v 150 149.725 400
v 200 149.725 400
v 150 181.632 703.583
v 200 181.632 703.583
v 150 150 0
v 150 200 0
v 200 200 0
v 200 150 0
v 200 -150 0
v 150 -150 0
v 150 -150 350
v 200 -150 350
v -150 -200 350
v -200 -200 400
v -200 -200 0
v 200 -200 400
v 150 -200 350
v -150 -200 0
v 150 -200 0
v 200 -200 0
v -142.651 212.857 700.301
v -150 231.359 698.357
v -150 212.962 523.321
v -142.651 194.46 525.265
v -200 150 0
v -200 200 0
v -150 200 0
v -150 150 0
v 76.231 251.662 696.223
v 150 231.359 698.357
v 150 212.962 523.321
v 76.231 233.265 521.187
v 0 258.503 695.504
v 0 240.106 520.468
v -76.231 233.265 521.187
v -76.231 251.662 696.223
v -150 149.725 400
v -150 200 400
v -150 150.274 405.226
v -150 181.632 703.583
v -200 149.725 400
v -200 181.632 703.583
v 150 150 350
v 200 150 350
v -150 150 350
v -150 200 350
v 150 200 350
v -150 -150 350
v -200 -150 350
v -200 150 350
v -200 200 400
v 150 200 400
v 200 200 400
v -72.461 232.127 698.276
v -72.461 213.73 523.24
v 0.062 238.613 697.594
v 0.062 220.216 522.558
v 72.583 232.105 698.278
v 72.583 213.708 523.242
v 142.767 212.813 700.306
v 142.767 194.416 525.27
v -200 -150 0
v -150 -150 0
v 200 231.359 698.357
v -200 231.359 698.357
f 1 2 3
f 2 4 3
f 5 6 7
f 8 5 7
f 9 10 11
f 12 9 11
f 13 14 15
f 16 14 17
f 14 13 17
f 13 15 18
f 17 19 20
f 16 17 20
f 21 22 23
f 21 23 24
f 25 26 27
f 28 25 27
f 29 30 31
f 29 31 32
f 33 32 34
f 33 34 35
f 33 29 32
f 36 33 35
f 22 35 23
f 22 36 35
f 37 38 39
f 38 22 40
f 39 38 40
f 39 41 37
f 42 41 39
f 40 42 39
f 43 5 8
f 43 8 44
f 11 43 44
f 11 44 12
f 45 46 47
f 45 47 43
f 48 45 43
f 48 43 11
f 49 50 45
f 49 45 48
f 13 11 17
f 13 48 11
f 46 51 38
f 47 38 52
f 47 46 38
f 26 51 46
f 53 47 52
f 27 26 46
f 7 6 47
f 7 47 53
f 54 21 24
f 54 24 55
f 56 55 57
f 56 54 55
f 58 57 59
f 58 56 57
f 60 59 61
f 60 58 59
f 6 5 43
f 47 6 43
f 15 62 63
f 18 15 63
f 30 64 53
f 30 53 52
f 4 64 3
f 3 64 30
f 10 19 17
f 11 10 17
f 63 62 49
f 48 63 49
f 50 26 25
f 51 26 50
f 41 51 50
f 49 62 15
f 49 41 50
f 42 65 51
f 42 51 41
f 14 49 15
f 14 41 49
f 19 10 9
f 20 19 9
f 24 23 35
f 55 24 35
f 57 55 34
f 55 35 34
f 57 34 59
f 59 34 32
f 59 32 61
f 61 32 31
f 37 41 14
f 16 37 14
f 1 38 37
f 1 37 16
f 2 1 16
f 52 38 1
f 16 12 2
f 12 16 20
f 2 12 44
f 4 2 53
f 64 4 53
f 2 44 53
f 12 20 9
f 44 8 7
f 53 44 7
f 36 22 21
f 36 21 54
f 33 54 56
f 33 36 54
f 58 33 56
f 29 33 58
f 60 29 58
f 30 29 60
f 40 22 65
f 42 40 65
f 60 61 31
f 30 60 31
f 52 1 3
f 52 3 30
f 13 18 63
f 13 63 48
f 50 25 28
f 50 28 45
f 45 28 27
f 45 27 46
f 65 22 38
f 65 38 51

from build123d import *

# Parameters (mm, degrees)
F0_W       = 400
F0_H       = 400
F1_DEPTH   = 400
F2_W       = 300
F2_H       = 350
F3_DEPTH   = 400.001
F4_W       = 300
F4_H       = 350
F5_DEPTH   = 400.001
F9_W       = 400
F9_H       = 300
F10_DEPTH  = 50
F11_W      = 300
F11_H      = 300
F12_DEPTH  = 50
F14_DEPTH  = 5.2552117633
F12_FACE_W = 50
F12_FACE_H = 50
F17_DEPTH  = 176


with BuildPart() as f1:
    # F0 (on Top) → F1 (new body)
    with BuildSketch(Plane.XY):
        Rectangle(F0_W, F0_H)
    extrude(amount=F1_DEPTH)

    # F2 (on face) → F3 (cut, through all)
    with BuildSketch(Plane.XZ.offset(200)):
        with Locations((0, 175)):
            Rectangle(F2_W, F2_H)
    extrude(amount=-F3_DEPTH, mode=Mode.SUBTRACT)

    # F4 (on face) → F5 (cut, through all)
    with BuildSketch(Plane(origin=(-200, 0, 0), x_dir=(0, -1, 0), z_dir=(-1, 0, 0))):
        with Locations((0, 175)):
            Rectangle(F4_W, F4_H)
    extrude(amount=-F5_DEPTH, mode=Mode.SUBTRACT)



with BuildPart() as f10:
    # F9 (on line) → F10 (new body)
    with BuildSketch(Plane(origin=(0, 156.2324219098, -16.4206892285), x_dir=(-1, 0, 0), z_dir=(0, 0.9945218954, -0.1045284633))):
        with Locations((0, 568.7144508008)):
            Rectangle(F9_W, F9_H)
    extrude(amount=-F10_DEPTH)

    # F11 (on face) → F12 (cut)
    with BuildSketch(Plane(origin=(0, 106.5063271414, -11.1942660652), x_dir=(1, 0, 0), z_dir=(0, -0.9945218954, 0.1045284633))):
        with Locations((0, 568.7144508008)):
            Rectangle(F11_W, F11_H)
    extrude(amount=-F12_DEPTH, mode=Mode.SUBTRACT)


with BuildPart() as f1_1:
    add(f1.part)
    # F14 (add, through all): a face of the model
    f14_faces = [f10.part.faces().sort_by_distance(p)[0] for p in [
        (175, 175.1369526158, 402.6132115817),
    ]]

    add(f10.part)  # F14 merges F10
    extrude(f14_faces, amount=F14_DEPTH)

    # F12_face (on face) → F15 (join, up to the next surface of F1)
    with BuildSketch(Plane(origin=(175, 175.1369526158, 402.6132115817), x_dir=(1, 0, 0), z_dir=(0, -0.1045284633, -0.9945218954))):
        with Locations((-350, 0)):
            Rectangle(F12_FACE_W, F12_FACE_H)
    extrude(until=Until.NEXT)


with BuildPart() as f17:
    # F16 (on mid) → F17 (new body)
    with BuildSketch(Plane(origin=(0, 75.1261170705, 714.777257839), x_dir=(1, 0, 0), z_dir=(0, 0.1045284633, 0.9945218954))):
        with BuildLine():
            Line((142.7670273287, 138.4455713383), (150, 157.0929937666))
            ThreePointArc((150, 157.0929937666), (0, 184.3869913259), (-150, 157.0929937666))
            Line((-150, 157.0929937666), (-142.6511627324, 138.4890950968))
            ThreePointArc((-142.6511627324, 138.4890950968), (0.0618848168, 164.3869866075), (142.7670273287, 138.4455713383))
        make_face()
    extrude(amount=-F17_DEPTH)


solid = Compound([f1_1.part, f17.part])
